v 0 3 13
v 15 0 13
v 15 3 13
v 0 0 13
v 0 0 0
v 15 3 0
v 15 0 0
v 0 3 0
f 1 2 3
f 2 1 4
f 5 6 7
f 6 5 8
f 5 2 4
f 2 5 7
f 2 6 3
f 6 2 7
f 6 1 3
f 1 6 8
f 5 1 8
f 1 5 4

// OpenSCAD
// Generated by SolidPython 1.0.1 on 2020-07-29 00:46:55


cube(size = [15, 3, 13]);
/***********************************************
*********      SolidPython code:      **********
************************************************
 
# import packages: SolidPython
from solid import *
from solid.utils import *
from itertools import chain, combinations, permutations


class Resize:

    def __init__(self, scad_file):
        self.scad_file = scad_file
        #self.scad_file = import_scad(scad_file)
        # cone/cylinder param:
        self.r1 = 0
        self.r2 = 0
        self.h = 0
        # rectangular prism param:
        self.w = 0
        self.l = 0
        # ellipse param:
        self.r = 0

    # import OpenScad code (file name corresponds to shape)


    # classify shape + parameters
    def assign(self, param1, param2, param3):
        if self.scad_file == 'cone.scad':
            self.r1 = param1
            self.r2 = param2
            self.h = param3
        elif self.scad_file == 'cylinder.scad':
            self.r1 = param1
            self.r2 = param2
            self.h = param3
        elif self.scad_file == 'rectangularPrism.scad':
            self.h = param1
            self.l = param2
            self.w = param3
        else:
            self.r = param1
            self.h = param2

    # resize parameters
    def iterate(self):
        x = range(3, 20, 2)
        i = 1
        if self.scad_file == 'cone.scad':
            tempList = list(permutations(x, 2))
            for temp in tempList:
                param1 = temp[0]
                param2 = temp[1]
                filepath = 'produced_scad_files/' + 'cone' + str(param1) + '_' + str(param2) + '_' + '.scad'
                scad_render_to_file(cylinder(h=param1, r1=param2, r2=0), filepath)

        elif self.scad_file == 'cylinder.scad':
            tempList = list(permutations(x, 3))
            for temp in tempList:
                param1 = temp[0]
                param2 = temp[1]
                filepath = 'produced_scad_files/' + 'cylinder' + str(param1) + '_' + str(param2) + '_' + '.scad'
                scad_render_to_file(cylinder(h=param1, r1=param2, r2=param2), filepath)

        elif self.scad_file == 'rectangularPrism.scad':
            tempList = list(permutations(x, 3))
            for temp in tempList:
                param1 = temp[0]
                param2 = temp[1]
                param3 = temp[2]
                filepath = 'produced_scad_files/' + 'rectangularPrism' + str(param1) + '_' + str(param2) + '_' + str(
                    param3) + '.scad'
                scad_render_to_file(cube(size=(param1, param2, param3)), filepath)

        elif self.scad_file == 'ellipse.scad':
            tempList = list(permutations(x, 4))
            for temp in tempList:
                param1 = temp[0]
                param2 = temp[1]
                param3 = temp[2]
                param4 = temp[3]
                filepath = 'produced_scad_files/' + 'ellipse' + str(param1) + '_' + str(param2) + '_' + str(param3) + '_' + str(param4) + '.scad'
                scad_render_to_file(scale([param1, param2, param3])(sphere(r=param4)), filepath)

    def render_to_scadfile(self):
        scad_render_to_file(scad, 'example.scad') 
 
************************************************/
